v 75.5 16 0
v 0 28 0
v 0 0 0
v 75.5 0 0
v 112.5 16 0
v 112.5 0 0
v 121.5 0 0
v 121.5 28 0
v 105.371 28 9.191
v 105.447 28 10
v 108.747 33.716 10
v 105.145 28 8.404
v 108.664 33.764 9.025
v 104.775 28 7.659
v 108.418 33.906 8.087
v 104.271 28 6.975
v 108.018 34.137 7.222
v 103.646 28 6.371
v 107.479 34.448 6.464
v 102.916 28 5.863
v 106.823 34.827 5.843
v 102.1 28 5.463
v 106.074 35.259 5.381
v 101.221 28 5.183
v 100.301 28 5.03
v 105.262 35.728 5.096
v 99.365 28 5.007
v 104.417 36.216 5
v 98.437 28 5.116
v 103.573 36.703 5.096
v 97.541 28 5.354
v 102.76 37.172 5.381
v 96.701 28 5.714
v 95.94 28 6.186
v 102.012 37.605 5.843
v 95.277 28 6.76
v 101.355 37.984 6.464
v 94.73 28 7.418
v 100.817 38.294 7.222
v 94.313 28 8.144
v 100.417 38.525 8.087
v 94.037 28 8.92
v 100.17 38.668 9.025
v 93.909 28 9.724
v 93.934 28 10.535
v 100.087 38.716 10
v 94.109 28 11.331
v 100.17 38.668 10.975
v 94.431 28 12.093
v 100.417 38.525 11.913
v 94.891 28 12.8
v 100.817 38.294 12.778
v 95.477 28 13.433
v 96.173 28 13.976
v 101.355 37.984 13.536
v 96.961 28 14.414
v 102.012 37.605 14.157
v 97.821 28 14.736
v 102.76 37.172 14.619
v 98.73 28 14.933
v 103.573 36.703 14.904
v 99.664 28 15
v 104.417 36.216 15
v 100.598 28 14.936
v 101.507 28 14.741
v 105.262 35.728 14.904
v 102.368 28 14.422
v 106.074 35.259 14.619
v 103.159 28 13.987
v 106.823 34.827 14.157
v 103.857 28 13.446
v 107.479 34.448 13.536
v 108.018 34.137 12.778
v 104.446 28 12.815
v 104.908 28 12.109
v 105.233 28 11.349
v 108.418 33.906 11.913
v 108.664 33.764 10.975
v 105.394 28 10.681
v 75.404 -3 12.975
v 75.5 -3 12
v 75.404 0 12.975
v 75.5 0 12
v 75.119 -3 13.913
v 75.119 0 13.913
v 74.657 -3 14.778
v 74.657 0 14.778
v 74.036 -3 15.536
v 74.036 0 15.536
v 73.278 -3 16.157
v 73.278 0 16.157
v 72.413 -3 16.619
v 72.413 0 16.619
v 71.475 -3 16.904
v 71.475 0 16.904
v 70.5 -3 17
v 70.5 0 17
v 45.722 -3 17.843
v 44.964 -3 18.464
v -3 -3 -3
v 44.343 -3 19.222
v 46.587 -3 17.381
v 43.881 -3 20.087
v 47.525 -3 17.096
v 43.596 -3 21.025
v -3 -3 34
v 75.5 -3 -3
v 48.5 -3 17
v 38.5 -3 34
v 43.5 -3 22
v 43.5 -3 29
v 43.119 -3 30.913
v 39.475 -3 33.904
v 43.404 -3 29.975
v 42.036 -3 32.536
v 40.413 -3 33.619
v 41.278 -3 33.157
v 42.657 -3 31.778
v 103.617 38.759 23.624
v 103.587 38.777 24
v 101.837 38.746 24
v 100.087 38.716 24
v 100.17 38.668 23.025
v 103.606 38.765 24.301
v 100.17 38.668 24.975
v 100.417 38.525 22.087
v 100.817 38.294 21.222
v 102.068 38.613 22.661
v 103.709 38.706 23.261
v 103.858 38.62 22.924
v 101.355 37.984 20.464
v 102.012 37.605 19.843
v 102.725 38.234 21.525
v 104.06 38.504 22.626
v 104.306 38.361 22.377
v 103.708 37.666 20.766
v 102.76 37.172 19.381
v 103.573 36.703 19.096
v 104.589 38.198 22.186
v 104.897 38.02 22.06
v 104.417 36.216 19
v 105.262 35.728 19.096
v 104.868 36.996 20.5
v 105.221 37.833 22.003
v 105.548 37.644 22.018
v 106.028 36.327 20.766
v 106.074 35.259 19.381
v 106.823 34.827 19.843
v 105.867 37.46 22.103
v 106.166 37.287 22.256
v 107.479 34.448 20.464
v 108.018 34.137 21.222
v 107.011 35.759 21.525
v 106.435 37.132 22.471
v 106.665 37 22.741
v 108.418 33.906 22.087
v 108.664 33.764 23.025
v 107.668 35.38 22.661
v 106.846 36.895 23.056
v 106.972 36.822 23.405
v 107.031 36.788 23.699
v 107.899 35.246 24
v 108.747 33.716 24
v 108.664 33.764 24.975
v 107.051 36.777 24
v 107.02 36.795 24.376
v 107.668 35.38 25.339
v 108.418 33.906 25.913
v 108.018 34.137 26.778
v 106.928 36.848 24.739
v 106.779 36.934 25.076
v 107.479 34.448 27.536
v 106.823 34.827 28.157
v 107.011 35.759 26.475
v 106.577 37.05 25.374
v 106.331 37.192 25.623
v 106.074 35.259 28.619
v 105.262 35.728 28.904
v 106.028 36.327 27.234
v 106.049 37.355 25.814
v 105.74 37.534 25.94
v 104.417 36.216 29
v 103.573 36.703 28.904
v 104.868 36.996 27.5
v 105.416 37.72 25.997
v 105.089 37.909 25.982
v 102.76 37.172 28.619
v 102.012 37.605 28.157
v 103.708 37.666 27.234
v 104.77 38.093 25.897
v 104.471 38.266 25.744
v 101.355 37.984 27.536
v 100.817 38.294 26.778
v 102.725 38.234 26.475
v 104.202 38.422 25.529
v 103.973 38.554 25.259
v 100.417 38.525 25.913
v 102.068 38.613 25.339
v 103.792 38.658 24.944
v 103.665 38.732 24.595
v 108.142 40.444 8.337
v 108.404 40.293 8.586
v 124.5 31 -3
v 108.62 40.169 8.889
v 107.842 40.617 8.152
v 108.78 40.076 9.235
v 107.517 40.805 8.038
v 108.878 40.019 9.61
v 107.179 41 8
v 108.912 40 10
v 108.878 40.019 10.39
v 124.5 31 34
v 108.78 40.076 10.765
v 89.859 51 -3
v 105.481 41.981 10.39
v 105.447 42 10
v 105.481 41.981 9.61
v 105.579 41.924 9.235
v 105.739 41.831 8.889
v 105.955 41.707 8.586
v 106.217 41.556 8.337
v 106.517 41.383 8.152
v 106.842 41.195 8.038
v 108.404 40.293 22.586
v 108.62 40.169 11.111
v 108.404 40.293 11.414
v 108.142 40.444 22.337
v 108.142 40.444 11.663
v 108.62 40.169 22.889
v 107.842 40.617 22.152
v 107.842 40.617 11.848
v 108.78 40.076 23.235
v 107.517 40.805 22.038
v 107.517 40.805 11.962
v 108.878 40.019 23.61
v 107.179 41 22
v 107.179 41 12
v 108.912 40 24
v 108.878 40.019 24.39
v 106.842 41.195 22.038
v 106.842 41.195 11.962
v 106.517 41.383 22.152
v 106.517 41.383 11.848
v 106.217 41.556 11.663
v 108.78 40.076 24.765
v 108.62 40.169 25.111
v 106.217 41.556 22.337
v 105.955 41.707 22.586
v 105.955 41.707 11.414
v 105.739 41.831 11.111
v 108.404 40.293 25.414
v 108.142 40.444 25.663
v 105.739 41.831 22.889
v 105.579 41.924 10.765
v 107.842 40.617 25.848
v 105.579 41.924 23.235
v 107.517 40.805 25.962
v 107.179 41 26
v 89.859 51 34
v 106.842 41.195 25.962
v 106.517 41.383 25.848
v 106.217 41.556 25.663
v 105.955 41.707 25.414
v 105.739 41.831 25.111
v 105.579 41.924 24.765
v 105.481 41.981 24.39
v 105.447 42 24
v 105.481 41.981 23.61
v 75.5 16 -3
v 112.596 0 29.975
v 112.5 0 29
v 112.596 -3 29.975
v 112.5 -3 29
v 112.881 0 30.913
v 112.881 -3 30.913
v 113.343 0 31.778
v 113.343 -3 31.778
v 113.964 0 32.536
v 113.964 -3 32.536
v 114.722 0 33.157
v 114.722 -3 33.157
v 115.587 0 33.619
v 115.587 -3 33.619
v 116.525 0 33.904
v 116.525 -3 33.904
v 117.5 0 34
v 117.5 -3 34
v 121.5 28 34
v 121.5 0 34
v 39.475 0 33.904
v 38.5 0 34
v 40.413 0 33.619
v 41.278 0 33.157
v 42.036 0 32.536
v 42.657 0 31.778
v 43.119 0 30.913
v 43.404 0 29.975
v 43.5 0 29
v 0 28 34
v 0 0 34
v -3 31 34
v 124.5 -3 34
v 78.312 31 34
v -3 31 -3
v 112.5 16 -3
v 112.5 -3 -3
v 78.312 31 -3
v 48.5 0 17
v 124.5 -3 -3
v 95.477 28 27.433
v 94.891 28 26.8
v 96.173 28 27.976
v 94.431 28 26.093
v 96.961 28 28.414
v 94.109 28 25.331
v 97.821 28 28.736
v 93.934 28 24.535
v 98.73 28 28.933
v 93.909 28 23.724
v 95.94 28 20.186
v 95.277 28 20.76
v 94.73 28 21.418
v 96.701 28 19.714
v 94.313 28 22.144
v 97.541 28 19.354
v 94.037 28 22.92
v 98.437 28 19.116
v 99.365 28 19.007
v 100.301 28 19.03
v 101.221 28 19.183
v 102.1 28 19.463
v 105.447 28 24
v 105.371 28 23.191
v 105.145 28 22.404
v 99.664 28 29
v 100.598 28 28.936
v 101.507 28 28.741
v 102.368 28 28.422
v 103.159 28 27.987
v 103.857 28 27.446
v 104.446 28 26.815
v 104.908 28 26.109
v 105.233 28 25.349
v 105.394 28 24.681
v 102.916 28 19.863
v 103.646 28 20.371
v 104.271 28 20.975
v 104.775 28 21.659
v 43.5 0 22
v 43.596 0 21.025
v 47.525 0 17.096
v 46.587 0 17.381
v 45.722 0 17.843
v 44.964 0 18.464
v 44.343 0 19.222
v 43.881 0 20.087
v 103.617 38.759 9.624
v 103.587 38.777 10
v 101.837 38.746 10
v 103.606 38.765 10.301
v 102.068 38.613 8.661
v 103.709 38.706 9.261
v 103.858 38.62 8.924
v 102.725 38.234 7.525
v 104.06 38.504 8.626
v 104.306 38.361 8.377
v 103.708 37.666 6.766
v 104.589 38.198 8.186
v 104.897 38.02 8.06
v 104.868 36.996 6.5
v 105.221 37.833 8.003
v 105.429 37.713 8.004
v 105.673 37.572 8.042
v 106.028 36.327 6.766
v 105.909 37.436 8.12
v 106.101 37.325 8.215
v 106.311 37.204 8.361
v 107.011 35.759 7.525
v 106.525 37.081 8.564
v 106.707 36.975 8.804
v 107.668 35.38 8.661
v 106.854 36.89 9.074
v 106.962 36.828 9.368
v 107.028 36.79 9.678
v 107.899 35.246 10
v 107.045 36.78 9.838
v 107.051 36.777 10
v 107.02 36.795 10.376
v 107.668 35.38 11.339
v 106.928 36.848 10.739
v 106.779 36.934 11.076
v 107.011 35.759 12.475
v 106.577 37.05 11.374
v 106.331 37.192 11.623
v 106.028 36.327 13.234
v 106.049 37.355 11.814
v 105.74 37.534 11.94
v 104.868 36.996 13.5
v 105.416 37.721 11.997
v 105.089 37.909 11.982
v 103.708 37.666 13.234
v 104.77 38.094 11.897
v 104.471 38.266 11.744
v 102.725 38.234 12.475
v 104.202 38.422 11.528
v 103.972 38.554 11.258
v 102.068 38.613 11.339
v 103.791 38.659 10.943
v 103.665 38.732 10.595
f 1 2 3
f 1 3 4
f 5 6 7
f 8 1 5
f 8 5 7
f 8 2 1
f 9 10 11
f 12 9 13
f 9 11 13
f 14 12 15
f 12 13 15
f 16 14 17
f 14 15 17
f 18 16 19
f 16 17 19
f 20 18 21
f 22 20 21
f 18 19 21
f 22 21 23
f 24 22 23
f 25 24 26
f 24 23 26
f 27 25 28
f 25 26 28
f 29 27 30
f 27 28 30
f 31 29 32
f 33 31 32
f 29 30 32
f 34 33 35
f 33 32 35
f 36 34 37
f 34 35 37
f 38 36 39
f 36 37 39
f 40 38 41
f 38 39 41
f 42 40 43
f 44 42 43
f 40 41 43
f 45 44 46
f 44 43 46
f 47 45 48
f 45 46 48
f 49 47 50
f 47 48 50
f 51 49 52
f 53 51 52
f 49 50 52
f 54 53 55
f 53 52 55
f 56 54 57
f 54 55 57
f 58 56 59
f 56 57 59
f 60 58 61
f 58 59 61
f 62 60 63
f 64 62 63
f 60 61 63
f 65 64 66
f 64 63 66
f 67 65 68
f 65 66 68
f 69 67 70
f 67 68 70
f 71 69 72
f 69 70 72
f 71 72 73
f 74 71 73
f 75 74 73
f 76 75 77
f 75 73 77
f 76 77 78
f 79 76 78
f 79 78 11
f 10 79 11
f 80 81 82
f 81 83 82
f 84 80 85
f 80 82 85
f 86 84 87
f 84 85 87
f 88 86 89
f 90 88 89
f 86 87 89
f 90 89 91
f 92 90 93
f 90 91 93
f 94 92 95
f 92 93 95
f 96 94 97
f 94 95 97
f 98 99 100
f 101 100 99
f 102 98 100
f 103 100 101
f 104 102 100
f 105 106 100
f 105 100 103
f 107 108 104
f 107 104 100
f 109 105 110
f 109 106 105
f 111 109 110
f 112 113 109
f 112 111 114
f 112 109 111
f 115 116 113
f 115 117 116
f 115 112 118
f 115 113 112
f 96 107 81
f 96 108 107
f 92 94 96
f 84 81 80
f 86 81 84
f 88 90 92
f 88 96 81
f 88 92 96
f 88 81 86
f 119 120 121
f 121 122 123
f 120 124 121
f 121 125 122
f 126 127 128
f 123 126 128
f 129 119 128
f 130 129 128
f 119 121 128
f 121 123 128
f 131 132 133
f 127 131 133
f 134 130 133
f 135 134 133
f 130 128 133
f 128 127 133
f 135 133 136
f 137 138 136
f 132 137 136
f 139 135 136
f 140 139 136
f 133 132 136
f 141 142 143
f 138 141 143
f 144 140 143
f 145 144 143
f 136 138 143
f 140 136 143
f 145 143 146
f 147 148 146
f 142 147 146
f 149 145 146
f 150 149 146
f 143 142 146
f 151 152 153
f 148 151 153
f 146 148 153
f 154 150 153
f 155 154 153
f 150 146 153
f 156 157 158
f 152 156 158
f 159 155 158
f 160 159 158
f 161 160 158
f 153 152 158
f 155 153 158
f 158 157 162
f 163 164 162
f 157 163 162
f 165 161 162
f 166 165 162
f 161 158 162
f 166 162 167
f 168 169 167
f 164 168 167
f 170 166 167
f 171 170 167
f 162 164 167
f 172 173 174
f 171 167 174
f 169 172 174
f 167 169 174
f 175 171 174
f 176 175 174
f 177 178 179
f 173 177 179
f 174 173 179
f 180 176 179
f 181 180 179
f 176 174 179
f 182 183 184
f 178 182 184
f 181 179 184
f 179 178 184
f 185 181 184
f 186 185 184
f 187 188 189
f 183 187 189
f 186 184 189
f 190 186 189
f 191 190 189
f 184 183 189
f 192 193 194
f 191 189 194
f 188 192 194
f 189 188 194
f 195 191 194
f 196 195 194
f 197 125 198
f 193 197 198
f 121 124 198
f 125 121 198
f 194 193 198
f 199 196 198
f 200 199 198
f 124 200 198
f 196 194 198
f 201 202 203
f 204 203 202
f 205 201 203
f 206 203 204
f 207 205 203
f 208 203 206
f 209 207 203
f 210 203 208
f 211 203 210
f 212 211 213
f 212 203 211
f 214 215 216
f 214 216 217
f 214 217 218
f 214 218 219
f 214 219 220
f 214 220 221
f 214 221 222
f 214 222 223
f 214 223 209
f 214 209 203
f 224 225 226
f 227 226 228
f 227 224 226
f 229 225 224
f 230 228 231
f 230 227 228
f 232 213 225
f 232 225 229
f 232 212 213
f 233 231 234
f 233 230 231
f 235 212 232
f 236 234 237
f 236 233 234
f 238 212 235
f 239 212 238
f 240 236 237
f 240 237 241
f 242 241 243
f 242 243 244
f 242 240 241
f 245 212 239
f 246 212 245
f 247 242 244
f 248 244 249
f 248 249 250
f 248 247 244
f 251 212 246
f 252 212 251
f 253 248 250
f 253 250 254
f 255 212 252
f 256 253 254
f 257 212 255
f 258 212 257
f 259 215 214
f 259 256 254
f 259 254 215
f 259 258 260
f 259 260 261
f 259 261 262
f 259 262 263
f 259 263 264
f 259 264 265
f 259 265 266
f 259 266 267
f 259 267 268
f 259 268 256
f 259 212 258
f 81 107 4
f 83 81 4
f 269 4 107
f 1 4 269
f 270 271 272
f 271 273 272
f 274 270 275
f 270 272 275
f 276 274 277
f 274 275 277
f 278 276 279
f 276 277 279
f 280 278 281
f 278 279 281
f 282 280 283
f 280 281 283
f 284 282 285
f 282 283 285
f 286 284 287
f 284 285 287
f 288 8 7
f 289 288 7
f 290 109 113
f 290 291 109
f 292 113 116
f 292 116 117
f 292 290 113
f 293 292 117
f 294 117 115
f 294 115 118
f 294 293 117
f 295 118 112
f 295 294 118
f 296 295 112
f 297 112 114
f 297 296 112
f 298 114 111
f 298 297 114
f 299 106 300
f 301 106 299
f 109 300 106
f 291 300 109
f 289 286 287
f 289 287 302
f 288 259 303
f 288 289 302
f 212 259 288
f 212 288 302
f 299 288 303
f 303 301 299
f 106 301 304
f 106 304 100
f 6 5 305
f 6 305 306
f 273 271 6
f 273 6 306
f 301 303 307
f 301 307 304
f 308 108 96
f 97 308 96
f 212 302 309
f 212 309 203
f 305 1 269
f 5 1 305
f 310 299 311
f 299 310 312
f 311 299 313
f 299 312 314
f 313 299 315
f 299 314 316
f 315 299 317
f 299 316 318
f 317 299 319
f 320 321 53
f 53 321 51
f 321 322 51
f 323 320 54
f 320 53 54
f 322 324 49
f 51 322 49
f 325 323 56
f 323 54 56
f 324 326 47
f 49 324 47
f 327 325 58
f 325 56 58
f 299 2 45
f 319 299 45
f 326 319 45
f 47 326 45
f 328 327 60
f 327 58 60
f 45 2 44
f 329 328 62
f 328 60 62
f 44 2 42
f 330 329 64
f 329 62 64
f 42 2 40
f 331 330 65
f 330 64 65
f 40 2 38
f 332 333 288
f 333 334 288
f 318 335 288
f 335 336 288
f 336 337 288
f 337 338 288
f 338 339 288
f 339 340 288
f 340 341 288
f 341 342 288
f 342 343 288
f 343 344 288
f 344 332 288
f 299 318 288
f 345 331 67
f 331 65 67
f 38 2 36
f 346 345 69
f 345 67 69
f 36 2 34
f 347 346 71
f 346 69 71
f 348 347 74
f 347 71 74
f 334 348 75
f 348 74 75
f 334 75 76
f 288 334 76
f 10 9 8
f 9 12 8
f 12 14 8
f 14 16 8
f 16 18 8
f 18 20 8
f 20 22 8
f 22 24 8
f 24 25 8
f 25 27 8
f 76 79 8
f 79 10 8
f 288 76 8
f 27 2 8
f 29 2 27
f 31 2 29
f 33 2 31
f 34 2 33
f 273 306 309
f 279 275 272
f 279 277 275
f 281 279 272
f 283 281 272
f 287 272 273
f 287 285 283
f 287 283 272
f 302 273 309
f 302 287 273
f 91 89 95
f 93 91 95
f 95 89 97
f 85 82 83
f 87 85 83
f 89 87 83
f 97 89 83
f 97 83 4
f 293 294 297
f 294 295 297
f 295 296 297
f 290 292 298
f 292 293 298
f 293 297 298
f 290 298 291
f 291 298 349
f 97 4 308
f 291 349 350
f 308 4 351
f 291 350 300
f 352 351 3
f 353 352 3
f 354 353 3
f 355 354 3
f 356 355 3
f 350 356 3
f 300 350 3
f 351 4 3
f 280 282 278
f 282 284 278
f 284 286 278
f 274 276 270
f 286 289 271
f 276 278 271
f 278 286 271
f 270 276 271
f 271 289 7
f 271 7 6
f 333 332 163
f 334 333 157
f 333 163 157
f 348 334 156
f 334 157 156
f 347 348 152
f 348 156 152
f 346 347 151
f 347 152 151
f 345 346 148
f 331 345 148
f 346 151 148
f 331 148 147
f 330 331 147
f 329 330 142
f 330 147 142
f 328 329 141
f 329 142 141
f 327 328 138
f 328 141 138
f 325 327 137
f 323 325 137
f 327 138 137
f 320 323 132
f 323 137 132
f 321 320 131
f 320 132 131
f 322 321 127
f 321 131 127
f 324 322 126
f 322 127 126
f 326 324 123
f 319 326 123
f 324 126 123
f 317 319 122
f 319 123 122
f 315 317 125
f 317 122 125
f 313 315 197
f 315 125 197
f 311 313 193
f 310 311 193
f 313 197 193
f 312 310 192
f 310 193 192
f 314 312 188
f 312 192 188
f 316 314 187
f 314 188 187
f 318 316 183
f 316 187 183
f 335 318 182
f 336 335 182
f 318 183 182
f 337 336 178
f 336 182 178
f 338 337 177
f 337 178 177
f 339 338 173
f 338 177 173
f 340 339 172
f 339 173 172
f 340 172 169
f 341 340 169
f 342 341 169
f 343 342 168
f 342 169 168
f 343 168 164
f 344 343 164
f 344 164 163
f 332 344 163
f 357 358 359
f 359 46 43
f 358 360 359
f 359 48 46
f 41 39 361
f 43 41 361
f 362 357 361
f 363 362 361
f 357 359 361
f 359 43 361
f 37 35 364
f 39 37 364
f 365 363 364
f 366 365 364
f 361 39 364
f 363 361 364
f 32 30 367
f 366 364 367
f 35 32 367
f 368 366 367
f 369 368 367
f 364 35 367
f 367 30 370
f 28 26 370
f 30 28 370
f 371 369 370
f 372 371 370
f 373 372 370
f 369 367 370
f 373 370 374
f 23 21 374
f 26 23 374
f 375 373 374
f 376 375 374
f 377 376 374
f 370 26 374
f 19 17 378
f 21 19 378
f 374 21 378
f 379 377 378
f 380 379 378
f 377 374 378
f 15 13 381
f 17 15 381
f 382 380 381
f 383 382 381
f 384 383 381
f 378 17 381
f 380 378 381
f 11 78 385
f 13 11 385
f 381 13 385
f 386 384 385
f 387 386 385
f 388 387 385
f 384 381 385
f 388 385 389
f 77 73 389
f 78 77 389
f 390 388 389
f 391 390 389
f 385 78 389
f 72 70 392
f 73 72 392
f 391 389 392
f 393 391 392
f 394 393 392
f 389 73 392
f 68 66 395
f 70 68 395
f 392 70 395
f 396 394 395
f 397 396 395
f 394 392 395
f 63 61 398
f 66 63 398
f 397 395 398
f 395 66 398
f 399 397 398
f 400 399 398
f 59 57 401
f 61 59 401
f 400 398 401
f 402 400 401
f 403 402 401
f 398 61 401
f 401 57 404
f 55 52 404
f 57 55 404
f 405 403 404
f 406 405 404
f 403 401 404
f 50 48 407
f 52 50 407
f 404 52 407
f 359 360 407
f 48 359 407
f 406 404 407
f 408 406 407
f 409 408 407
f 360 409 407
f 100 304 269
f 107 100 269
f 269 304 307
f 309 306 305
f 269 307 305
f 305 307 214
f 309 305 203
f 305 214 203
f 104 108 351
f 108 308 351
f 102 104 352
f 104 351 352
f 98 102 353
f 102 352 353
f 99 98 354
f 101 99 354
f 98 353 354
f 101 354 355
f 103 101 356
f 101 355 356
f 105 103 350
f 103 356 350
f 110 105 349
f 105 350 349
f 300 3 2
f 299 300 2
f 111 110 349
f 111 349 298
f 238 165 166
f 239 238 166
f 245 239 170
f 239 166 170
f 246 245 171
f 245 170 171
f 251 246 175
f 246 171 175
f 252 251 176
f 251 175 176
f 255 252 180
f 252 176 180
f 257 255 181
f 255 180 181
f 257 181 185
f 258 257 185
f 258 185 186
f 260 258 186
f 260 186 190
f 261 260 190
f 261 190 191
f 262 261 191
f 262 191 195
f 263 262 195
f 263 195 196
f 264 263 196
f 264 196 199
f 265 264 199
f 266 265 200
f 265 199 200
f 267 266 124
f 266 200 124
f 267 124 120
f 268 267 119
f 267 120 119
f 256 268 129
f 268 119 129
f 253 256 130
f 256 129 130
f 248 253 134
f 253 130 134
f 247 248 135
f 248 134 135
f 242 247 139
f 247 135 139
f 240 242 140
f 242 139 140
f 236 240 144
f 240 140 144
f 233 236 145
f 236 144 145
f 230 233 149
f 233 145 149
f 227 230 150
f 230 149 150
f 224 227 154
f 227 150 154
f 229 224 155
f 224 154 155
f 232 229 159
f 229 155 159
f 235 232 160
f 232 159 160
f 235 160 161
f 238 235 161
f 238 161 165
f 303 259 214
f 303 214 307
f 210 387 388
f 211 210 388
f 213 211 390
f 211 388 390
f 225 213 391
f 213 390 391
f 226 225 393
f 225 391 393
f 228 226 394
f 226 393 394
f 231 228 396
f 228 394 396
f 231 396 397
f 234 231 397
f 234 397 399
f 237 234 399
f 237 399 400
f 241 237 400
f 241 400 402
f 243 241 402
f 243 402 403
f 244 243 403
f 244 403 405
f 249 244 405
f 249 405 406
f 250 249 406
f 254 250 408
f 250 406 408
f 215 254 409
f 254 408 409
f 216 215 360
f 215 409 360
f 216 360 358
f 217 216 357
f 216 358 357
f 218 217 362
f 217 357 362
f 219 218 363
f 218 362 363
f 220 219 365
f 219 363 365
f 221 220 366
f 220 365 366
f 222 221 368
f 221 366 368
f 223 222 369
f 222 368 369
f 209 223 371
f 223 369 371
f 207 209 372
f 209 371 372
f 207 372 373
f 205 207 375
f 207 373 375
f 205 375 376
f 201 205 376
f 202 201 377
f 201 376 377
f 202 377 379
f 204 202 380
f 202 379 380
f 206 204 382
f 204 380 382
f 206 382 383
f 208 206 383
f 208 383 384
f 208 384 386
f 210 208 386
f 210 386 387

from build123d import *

# Parameters (mm, degrees)
F1_DEPTH = 34
F2_DEPTH = 3
F3_W     = 32
F3_H     = 17
F4_DEPTH = 3
F6_D     = 4
F9_D     = 10
F9_DEPTH = 6.6
F9_START = 8.6756443
F9_TIP   = 3.0043030951
F10_R    = 5


with BuildPart() as f1:
    # F0 (on Top) → F1 (new body)
    with BuildSketch(Plane.XY):
        Polygon((75.5, 0), (0, 0), (0, 28), (121.5, 28), (121.5, 0), (112.5, 0), (112.5, -3), (124.5, -3), (124.5, 31), (89.8589838486, 51), (78.3119784648, 31), (-3, 31), (-3, -3), (75.5, -3), align=None)
    extrude(amount=F1_DEPTH)

    # F0 (on Top) → F2 (join)
    with BuildSketch(Plane.XY):
        Polygon((0, 28), (0, 0), (75.5, 0), (75.5, 16), (112.5, 16), (112.5, 0), (121.5, 0), (121.5, 28), align=None)
        Polygon((75.5, 0), (0, 0), (0, 28), (121.5, 28), (121.5, 0), (112.5, 0), (112.5, -3), (124.5, -3), (124.5, 31), (89.8589838486, 51), (78.3119784648, 31), (-3, 31), (-3, -3), (75.5, -3), align=None)
    extrude(amount=-F2_DEPTH)

    # F3 (on face) → F4 (cut, through all)
    with BuildSketch(Plane.XZ.offset(3)):
        with Locations((59.5, 25.5)):
            Rectangle(F3_W, F3_H)
    extrude(amount=-F4_DEPTH, mode=Mode.SUBTRACT)

    # F6 (through all)
    with Locations(Plane(origin=(44.5483937587, 77.1600813856, 0), x_dir=(-0.8660254038, 0.5, 0), z_dir=(0.5, 0.8660254038, 0))):
        with Locations((-72.3201627712, 24), (-72.3201627712, 10)):
            Hole(F6_D / 2)

    # F9
    # its depths count from where the whole tool has entered the part; down to there all is cleared
    with Locations(Plane(origin=(34.1483937587, 59.1467529869, 0), x_dir=(-0.8660254038, 0.5, 0), z_dir=(-0.5, -0.8660254038, 0))):
        with Locations((-72.3201627712, -24), (-72.3201627712, -10)):
            Hole(F9_D / 2, depth=F9_START)
    with Locations(Plane(origin=(34.1483937587, 59.1467529869, 0), x_dir=(-0.8660254038, 0.5, 0), z_dir=(-0.5, -0.8660254038, 0)).offset(-F9_START)):
        with Locations((-72.3201627712, -24), (-72.3201627712, -10)):
            Hole(F9_D / 2, depth=F9_DEPTH)
            with Locations((0, 0, -(F9_DEPTH + F9_TIP / 2))):  # 118° drill point
                Cone(0, F9_D / 2, F9_TIP, mode=Mode.SUBTRACT)

    # F10
    f10_edges = [f1.edges().sort_by_distance(p)[0] for p in [
        (112.5, -1.5, 34),
        (43.5, -1.5, 34),
        (75.5, -1.5, 17),
        (43.5, -1.5, 17),
    ]]
    fillet(f10_edges, radius=F10_R)


solid = f1.part
